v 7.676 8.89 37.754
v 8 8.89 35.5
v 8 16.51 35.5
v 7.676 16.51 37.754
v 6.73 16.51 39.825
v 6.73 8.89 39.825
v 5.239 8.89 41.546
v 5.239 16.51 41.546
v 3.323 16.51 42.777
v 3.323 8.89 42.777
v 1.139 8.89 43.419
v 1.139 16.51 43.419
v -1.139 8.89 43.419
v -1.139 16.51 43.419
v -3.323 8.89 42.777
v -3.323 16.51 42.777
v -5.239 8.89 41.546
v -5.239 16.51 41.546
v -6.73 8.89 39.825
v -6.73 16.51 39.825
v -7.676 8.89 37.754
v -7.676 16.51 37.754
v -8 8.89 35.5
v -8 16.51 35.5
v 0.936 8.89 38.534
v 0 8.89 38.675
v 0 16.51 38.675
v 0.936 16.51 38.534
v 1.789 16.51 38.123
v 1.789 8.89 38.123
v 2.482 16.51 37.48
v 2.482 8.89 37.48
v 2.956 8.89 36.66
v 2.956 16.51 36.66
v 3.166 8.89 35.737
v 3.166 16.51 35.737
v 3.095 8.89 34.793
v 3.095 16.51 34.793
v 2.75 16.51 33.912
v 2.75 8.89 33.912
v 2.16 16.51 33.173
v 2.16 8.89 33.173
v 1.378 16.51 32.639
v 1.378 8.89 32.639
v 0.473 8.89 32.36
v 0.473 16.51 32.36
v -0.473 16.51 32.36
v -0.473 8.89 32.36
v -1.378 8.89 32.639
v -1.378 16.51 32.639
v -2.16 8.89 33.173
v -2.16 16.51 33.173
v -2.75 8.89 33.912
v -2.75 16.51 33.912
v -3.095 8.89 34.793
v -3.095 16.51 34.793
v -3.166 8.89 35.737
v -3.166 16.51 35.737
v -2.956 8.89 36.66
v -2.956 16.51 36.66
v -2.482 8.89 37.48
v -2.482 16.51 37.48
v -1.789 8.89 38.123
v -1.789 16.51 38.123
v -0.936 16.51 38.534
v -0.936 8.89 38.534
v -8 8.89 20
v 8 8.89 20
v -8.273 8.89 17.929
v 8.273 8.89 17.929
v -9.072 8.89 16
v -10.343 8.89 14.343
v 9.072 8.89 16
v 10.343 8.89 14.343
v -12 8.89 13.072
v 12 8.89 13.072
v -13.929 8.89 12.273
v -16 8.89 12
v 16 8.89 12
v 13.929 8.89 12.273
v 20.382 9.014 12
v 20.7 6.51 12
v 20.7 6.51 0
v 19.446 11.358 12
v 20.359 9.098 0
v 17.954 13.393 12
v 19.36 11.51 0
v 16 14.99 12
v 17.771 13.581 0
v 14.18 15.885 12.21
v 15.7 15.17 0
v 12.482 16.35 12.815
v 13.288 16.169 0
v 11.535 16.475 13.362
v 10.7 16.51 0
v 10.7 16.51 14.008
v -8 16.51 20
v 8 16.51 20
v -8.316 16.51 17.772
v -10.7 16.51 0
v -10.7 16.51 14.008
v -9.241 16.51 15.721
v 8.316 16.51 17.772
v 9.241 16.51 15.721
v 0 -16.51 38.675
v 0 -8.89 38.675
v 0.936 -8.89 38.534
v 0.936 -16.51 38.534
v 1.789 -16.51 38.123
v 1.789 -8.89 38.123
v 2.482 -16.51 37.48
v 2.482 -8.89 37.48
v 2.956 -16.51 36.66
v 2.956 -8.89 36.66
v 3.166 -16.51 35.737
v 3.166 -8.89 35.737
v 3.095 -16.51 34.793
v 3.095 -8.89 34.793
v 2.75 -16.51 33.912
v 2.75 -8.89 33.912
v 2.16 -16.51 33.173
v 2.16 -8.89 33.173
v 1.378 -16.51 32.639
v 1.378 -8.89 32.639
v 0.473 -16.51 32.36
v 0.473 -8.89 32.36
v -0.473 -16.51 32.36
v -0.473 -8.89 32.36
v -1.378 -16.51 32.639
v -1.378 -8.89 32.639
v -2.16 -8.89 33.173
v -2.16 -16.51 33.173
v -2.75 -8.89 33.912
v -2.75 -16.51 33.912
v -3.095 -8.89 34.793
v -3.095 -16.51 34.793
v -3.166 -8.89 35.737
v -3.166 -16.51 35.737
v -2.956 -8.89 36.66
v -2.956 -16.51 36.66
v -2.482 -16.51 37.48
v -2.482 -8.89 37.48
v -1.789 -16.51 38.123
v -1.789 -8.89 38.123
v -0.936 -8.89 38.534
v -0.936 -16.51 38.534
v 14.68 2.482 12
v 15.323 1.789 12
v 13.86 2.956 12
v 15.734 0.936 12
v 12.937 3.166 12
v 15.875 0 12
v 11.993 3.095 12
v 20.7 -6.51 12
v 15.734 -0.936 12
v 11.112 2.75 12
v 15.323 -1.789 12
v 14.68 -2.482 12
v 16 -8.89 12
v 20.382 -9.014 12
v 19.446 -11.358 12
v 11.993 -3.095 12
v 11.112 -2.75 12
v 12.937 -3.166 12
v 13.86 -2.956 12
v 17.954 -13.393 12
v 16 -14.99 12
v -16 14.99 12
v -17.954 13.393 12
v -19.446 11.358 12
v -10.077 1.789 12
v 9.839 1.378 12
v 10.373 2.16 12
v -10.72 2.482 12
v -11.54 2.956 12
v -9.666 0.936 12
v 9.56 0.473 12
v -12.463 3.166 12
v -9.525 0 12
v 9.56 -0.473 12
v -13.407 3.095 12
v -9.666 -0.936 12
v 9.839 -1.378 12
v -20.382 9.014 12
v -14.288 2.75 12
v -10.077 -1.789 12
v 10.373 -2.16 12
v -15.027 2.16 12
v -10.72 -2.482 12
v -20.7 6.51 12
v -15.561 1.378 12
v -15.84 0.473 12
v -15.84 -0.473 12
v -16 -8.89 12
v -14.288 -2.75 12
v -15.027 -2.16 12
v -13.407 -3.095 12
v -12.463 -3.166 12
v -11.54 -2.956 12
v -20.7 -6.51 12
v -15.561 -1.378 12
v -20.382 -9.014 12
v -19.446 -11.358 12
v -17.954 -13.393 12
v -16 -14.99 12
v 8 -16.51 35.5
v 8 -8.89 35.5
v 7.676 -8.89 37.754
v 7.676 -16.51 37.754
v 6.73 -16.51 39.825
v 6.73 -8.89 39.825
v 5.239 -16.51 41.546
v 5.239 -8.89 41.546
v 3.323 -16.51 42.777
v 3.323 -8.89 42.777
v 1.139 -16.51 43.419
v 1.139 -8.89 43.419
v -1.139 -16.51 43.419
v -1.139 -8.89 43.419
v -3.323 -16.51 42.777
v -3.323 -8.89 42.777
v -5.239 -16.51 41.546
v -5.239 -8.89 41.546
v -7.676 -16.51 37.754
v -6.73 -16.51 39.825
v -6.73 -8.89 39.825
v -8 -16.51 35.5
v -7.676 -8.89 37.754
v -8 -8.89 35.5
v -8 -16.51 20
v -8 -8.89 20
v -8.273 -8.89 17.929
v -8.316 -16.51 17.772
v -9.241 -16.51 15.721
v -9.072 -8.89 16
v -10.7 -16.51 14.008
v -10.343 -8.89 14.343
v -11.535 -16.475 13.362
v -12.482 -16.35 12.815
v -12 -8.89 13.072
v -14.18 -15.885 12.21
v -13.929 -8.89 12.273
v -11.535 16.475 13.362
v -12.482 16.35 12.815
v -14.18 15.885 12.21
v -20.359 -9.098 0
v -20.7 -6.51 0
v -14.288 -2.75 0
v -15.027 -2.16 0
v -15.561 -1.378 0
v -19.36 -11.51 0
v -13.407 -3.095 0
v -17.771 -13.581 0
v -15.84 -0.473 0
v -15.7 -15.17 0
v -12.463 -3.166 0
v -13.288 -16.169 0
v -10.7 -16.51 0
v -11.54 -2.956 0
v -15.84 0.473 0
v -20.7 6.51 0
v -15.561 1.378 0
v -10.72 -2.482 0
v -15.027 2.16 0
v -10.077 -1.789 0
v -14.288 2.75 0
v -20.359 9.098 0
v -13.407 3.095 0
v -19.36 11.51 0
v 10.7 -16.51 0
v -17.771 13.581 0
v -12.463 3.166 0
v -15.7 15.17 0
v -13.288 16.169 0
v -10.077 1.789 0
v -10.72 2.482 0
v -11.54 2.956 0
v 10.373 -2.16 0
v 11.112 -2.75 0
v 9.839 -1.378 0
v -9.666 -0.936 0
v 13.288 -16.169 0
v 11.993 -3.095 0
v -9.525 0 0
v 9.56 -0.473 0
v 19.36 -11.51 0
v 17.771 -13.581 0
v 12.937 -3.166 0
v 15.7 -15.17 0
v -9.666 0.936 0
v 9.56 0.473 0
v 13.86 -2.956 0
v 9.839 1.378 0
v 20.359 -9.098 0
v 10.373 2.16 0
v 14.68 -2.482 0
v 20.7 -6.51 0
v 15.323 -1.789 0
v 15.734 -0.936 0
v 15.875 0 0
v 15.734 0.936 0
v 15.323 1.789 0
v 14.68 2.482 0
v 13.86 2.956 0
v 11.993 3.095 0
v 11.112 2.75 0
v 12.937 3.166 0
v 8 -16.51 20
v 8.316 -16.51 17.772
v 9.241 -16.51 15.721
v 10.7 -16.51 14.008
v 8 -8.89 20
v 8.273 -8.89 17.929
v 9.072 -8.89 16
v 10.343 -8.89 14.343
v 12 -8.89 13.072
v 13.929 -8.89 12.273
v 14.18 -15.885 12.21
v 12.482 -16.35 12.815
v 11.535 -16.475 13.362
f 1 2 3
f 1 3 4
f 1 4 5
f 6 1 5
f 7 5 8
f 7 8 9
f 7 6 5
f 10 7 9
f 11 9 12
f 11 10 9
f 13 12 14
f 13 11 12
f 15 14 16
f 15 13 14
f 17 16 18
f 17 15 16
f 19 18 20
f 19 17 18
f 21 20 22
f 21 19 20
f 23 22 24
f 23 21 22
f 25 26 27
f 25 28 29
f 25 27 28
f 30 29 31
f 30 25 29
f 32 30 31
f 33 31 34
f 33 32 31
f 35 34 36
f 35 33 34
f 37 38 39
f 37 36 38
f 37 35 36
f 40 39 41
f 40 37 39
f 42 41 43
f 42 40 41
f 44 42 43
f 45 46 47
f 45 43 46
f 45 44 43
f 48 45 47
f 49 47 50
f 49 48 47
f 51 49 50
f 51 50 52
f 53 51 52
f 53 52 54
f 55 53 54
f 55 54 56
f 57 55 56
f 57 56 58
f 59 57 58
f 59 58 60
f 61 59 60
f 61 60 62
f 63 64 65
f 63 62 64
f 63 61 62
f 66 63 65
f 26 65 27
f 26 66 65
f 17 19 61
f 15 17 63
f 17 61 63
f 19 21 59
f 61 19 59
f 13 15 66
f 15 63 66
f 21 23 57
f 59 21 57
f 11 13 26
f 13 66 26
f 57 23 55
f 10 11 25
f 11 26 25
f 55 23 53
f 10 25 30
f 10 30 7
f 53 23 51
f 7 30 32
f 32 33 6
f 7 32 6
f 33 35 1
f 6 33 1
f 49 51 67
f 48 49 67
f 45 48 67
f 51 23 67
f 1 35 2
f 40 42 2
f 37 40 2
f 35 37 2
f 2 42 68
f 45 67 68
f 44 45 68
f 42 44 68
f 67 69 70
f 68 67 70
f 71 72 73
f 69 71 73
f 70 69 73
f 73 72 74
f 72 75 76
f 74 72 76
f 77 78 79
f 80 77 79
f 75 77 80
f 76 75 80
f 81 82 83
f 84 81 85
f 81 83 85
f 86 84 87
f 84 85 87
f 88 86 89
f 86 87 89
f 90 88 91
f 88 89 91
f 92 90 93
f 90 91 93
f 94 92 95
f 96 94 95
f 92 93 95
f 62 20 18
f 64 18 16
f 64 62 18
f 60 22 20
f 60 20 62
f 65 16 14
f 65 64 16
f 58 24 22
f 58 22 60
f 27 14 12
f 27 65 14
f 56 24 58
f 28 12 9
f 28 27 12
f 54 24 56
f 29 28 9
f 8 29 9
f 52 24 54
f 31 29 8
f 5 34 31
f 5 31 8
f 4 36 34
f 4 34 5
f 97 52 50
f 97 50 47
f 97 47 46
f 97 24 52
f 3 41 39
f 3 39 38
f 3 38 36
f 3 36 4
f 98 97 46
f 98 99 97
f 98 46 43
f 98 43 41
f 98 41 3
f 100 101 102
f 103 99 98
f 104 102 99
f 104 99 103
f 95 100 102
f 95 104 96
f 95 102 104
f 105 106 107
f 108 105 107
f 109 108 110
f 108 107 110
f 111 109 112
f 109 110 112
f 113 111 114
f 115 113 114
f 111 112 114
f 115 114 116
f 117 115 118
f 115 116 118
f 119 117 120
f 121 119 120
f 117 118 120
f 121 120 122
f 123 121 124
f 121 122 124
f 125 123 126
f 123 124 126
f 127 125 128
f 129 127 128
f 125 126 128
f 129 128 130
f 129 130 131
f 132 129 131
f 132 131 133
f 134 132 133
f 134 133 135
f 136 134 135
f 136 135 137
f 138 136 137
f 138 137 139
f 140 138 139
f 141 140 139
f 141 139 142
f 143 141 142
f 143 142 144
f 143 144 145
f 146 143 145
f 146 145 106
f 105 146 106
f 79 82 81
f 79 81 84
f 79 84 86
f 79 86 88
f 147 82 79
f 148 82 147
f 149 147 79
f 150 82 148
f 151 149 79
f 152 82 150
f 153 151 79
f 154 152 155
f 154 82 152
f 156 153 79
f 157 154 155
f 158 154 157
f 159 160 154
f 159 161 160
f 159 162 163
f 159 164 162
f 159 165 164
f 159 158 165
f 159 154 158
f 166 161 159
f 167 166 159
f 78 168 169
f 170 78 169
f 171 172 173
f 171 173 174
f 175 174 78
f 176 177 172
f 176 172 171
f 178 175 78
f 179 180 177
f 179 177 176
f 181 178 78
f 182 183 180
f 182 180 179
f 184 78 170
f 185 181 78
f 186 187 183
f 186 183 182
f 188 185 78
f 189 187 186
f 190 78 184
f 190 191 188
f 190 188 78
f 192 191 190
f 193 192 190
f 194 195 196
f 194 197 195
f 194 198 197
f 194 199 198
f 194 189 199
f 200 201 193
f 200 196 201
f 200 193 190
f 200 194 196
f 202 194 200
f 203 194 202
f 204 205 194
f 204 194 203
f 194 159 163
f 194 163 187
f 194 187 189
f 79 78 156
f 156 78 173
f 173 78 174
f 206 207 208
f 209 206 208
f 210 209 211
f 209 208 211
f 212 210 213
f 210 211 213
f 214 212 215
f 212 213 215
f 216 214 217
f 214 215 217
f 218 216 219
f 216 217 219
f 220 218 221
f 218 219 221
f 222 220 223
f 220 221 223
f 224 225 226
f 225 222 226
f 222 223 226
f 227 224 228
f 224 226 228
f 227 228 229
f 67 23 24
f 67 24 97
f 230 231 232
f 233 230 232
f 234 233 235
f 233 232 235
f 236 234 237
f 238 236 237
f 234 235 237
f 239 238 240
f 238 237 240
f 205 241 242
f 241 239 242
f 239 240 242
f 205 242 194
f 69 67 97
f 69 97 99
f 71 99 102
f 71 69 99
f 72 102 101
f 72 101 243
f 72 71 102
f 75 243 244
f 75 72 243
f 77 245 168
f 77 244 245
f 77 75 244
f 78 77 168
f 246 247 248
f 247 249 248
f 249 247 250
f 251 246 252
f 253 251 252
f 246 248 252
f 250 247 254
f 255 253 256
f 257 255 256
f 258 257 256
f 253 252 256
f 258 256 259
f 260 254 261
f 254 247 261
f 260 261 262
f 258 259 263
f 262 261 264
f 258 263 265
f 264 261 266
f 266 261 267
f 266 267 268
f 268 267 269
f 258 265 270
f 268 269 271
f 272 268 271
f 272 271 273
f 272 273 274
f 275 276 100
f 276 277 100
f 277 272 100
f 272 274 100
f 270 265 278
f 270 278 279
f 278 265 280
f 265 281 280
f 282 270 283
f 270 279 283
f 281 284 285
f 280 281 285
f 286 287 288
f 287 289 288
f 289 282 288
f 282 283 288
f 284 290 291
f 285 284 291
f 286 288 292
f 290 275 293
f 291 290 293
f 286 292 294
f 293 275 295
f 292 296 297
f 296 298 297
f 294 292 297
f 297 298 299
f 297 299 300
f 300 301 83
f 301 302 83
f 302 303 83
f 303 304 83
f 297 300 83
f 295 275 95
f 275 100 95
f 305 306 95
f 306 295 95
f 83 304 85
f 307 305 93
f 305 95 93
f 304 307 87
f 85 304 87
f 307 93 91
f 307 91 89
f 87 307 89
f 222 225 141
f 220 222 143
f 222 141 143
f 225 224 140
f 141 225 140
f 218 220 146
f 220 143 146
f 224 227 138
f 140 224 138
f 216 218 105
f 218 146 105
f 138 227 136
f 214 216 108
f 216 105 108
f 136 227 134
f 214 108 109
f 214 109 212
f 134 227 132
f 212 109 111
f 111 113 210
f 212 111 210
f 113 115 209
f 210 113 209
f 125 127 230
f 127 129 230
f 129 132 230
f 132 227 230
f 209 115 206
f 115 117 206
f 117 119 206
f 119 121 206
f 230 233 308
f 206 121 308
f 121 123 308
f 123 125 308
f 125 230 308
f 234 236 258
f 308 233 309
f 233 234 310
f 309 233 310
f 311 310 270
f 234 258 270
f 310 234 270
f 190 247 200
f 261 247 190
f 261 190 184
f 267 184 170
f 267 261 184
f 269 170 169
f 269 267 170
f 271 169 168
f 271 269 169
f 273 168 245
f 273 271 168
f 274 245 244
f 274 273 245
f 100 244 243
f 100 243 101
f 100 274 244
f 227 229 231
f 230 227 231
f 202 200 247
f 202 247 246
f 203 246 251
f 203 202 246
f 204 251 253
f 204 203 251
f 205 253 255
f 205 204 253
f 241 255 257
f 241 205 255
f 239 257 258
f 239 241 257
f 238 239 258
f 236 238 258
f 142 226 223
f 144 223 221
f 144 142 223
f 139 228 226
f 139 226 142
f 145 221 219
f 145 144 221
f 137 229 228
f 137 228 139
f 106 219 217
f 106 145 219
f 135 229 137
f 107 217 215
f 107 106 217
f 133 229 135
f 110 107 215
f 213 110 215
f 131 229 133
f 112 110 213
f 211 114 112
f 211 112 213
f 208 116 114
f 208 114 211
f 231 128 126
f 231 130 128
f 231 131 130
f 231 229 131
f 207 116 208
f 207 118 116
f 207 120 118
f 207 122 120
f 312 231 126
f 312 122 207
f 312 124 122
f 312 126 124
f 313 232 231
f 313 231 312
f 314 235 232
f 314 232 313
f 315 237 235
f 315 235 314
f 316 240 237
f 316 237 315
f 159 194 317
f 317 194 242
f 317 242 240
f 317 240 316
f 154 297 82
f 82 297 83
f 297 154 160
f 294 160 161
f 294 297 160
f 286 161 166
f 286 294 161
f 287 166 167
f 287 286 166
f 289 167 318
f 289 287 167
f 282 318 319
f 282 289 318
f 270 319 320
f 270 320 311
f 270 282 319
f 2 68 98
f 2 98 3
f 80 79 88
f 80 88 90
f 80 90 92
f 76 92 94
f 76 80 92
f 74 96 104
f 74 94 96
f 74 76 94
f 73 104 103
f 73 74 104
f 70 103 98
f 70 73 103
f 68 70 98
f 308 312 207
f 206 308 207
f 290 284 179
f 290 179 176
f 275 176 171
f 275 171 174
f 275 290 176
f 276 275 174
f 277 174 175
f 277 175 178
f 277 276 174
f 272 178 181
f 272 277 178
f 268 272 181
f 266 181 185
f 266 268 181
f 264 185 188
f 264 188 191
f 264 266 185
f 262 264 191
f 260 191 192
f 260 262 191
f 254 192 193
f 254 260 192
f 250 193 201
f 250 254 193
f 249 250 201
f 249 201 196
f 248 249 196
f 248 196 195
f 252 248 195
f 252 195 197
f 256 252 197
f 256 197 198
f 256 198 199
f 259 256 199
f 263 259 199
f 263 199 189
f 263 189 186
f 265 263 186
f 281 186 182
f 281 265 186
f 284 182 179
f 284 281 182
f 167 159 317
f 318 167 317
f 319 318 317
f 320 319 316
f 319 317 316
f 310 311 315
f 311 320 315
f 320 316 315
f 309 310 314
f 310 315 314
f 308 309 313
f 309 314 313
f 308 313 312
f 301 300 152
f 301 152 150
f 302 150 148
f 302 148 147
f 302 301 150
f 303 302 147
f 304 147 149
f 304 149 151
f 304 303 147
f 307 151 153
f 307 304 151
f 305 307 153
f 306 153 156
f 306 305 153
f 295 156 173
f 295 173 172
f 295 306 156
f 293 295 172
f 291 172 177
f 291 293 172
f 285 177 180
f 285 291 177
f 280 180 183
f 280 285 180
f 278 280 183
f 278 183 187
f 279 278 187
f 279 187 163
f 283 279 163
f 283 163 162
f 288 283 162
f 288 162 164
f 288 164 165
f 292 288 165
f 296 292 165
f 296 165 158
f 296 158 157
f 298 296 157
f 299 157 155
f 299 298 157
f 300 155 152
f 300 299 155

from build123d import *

# Parameters (mm, degrees)
SKETCH1_W                      = 41.4
SKETCH1_H                      = 33.02
SKETCH1_R                      = 3.175
BOSS_EXTRUDE1_DEPTH            = 12
SKETCH2_W                      = 41.4
SKETCH2_H                      = 7.62
BOSS_EXTRUDE2_DEPTH            = 53
CUT_EXTRUDE1_REACH             = 72.186
SKETCH4_R                      = 3.175
CUT_EXTRUDE1_DIRECTION_2_REACH = 72.186
CUT_EXTRUDE3_REACH             = 72.186
CUT_EXTRUDE3_DIRECTION_2_REACH = 72.186
FILLET1_R                      = 10


with BuildPart() as part:
    # Sketch1 → Boss-Extrude1 (new body)
    with BuildSketch(Plane.XY):
        Rectangle(SKETCH1_W, SKETCH1_H)
        with Locations((12.7, 0)):
            Circle(SKETCH1_R, mode=Mode.SUBTRACT)
        with Locations((-12.7, 0)):
            Circle(SKETCH1_R, mode=Mode.SUBTRACT)
    extrude(amount=BOSS_EXTRUDE1_DEPTH)

    # Sketch2 → Boss-Extrude2 (add)
    with BuildSketch(Plane.XY.offset(12)):
        with Locations((0, 12.7)):
            Rectangle(SKETCH2_W, SKETCH2_H)
        with Locations((0, -12.7)):
            Rectangle(SKETCH2_W, SKETCH2_H)
    extrude(amount=BOSS_EXTRUDE2_DEPTH)

    # Cut-Extrude1: up to this face of the body (flat: up to its plane)
    cut_extrude1_end = Plane(part.part.faces().sort_by_distance((0, -16.51, 32.5))[0])
    # Sketch4 → Cut-Extrude1 (cut, up to the picked face)
    with BuildSketch(Plane(origin=(0, 0, 0), x_dir=(1, 0, 0), z_dir=(0, 1, 0)), mode=Mode.PRIVATE) as cut_extrude1_sk1:
        with Locations(Location((0, -35.5, 0), (0, 0, 270))):
            Circle(SKETCH4_R)
    cut_extrude1_tool1 = split(extrude(cut_extrude1_sk1.sketch, amount=-CUT_EXTRUDE1_REACH, mode=Mode.PRIVATE), bisect_by=cut_extrude1_end, keep=Keep.BOTH, mode=Mode.PRIVATE)
    add(cut_extrude1_tool1.solids().sort_by(Axis((0, 0, 35.5), (0, -1, 0)))[0], mode=Mode.SUBTRACT)

    # Cut-Extrude1 direction 2: up to this face of the body (flat: up to its plane)
    cut_extrude1_direction_2_end = Plane(part.part.faces().sort_by_distance((0, 16.51, 32.5))[0])
    # Sketch4 → Cut-Extrude1 direction 2 (cut, up to the picked face)
    with BuildSketch(Plane(origin=(0, 0, 0), x_dir=(1, 0, 0), z_dir=(0, 1, 0)), mode=Mode.PRIVATE) as cut_extrude1_direction_2_sk1:
        with Locations(Location((0, -35.5, 0), (0, 0, 270))):
            Circle(SKETCH4_R)
    cut_extrude1_direction_2_tool1 = split(extrude(cut_extrude1_direction_2_sk1.sketch, amount=CUT_EXTRUDE1_DIRECTION_2_REACH, mode=Mode.PRIVATE), bisect_by=cut_extrude1_direction_2_end, keep=Keep.BOTH, mode=Mode.PRIVATE)
    add(cut_extrude1_direction_2_tool1.solids().sort_by(Axis((0, 0, 35.5), (0, 1, 0)))[0], mode=Mode.SUBTRACT)

    # Cut-Extrude3: up to this face of the body (flat: up to its plane)
    cut_extrude3_end = Plane(part.part.faces().sort_by_distance((-19.929353518, -16.51, 32.5))[0])
    # Sketch6 → Cut-Extrude3 (cut, up to the picked face)
    with BuildSketch(Plane(origin=(0, 0, 0), x_dir=(1, 0, 0), z_dir=(0, 1, 0)), mode=Mode.PRIVATE) as cut_extrude3_sk1:
        with BuildLine():
            Line((-8, -35.5), (-8, -20))
            ThreePointArc((-8, -20), (-10.343145751, -14.343145751), (-16, -12))
            Line((-16, -12), (-20.7, -12))
            Line((-20.7, -12), (-20.7, -65))
            Line((-20.7, -65), (20.7, -65))
            Line((20.7, -65), (20.7, -12))
            Line((20.7, -12), (16, -12))
            ThreePointArc((16, -12), (10.343145751, -14.343145751), (8, -20))
            Line((8, -20), (8, -35.5))
            ThreePointArc((8, -35.5), (0, -43.5), (-8, -35.5))
        make_face()
    cut_extrude3_tool1 = split(extrude(cut_extrude3_sk1.sketch, amount=-CUT_EXTRUDE3_REACH, mode=Mode.PRIVATE), bisect_by=cut_extrude3_end, keep=Keep.BOTH, mode=Mode.PRIVATE)
    add(cut_extrude3_tool1.solids().sort_by(Axis((-8.67253, 0, 27.75), (0, -1, 0)))[0], mode=Mode.SUBTRACT)

    # Cut-Extrude3 direction 2: up to this face of the body (flat: up to its plane)
    cut_extrude3_direction_2_end = Plane(part.part.faces().sort_by_distance((19.929353518, 16.51, 32.5))[0])
    # Sketch6 → Cut-Extrude3 direction 2 (cut, up to the picked face)
    with BuildSketch(Plane(origin=(0, 0, 0), x_dir=(1, 0, 0), z_dir=(0, 1, 0)), mode=Mode.PRIVATE) as cut_extrude3_direction_2_sk1:
        with BuildLine():
            Line((-8, -35.5), (-8, -20))
            ThreePointArc((-8, -20), (-10.343145751, -14.343145751), (-16, -12))
            Line((-16, -12), (-20.7, -12))
            Line((-20.7, -12), (-20.7, -65))
            Line((-20.7, -65), (20.7, -65))
            Line((20.7, -65), (20.7, -12))
            Line((20.7, -12), (16, -12))
            ThreePointArc((16, -12), (10.343145751, -14.343145751), (8, -20))
            Line((8, -20), (8, -35.5))
            ThreePointArc((8, -35.5), (0, -43.5), (-8, -35.5))
        make_face()
    cut_extrude3_direction_2_tool1 = split(extrude(cut_extrude3_direction_2_sk1.sketch, amount=CUT_EXTRUDE3_DIRECTION_2_REACH, mode=Mode.PRIVATE), bisect_by=cut_extrude3_direction_2_end, keep=Keep.BOTH, mode=Mode.PRIVATE)
    add(cut_extrude3_direction_2_tool1.solids().sort_by(Axis((-8.67253, 0, 27.75), (0, 1, 0)))[0], mode=Mode.SUBTRACT)

    # Fillet1
    fillet1_edges = [part.edges().sort_by_distance(p)[0] for p in [
        (-20.7, -16.51, 6),
        (-20.7, 16.51, 6),
        (20.7, -16.51, 6),
        (20.7, 16.51, 6),
    ]]
    fillet(fillet1_edges, radius=FILLET1_R)


solid = part.part
